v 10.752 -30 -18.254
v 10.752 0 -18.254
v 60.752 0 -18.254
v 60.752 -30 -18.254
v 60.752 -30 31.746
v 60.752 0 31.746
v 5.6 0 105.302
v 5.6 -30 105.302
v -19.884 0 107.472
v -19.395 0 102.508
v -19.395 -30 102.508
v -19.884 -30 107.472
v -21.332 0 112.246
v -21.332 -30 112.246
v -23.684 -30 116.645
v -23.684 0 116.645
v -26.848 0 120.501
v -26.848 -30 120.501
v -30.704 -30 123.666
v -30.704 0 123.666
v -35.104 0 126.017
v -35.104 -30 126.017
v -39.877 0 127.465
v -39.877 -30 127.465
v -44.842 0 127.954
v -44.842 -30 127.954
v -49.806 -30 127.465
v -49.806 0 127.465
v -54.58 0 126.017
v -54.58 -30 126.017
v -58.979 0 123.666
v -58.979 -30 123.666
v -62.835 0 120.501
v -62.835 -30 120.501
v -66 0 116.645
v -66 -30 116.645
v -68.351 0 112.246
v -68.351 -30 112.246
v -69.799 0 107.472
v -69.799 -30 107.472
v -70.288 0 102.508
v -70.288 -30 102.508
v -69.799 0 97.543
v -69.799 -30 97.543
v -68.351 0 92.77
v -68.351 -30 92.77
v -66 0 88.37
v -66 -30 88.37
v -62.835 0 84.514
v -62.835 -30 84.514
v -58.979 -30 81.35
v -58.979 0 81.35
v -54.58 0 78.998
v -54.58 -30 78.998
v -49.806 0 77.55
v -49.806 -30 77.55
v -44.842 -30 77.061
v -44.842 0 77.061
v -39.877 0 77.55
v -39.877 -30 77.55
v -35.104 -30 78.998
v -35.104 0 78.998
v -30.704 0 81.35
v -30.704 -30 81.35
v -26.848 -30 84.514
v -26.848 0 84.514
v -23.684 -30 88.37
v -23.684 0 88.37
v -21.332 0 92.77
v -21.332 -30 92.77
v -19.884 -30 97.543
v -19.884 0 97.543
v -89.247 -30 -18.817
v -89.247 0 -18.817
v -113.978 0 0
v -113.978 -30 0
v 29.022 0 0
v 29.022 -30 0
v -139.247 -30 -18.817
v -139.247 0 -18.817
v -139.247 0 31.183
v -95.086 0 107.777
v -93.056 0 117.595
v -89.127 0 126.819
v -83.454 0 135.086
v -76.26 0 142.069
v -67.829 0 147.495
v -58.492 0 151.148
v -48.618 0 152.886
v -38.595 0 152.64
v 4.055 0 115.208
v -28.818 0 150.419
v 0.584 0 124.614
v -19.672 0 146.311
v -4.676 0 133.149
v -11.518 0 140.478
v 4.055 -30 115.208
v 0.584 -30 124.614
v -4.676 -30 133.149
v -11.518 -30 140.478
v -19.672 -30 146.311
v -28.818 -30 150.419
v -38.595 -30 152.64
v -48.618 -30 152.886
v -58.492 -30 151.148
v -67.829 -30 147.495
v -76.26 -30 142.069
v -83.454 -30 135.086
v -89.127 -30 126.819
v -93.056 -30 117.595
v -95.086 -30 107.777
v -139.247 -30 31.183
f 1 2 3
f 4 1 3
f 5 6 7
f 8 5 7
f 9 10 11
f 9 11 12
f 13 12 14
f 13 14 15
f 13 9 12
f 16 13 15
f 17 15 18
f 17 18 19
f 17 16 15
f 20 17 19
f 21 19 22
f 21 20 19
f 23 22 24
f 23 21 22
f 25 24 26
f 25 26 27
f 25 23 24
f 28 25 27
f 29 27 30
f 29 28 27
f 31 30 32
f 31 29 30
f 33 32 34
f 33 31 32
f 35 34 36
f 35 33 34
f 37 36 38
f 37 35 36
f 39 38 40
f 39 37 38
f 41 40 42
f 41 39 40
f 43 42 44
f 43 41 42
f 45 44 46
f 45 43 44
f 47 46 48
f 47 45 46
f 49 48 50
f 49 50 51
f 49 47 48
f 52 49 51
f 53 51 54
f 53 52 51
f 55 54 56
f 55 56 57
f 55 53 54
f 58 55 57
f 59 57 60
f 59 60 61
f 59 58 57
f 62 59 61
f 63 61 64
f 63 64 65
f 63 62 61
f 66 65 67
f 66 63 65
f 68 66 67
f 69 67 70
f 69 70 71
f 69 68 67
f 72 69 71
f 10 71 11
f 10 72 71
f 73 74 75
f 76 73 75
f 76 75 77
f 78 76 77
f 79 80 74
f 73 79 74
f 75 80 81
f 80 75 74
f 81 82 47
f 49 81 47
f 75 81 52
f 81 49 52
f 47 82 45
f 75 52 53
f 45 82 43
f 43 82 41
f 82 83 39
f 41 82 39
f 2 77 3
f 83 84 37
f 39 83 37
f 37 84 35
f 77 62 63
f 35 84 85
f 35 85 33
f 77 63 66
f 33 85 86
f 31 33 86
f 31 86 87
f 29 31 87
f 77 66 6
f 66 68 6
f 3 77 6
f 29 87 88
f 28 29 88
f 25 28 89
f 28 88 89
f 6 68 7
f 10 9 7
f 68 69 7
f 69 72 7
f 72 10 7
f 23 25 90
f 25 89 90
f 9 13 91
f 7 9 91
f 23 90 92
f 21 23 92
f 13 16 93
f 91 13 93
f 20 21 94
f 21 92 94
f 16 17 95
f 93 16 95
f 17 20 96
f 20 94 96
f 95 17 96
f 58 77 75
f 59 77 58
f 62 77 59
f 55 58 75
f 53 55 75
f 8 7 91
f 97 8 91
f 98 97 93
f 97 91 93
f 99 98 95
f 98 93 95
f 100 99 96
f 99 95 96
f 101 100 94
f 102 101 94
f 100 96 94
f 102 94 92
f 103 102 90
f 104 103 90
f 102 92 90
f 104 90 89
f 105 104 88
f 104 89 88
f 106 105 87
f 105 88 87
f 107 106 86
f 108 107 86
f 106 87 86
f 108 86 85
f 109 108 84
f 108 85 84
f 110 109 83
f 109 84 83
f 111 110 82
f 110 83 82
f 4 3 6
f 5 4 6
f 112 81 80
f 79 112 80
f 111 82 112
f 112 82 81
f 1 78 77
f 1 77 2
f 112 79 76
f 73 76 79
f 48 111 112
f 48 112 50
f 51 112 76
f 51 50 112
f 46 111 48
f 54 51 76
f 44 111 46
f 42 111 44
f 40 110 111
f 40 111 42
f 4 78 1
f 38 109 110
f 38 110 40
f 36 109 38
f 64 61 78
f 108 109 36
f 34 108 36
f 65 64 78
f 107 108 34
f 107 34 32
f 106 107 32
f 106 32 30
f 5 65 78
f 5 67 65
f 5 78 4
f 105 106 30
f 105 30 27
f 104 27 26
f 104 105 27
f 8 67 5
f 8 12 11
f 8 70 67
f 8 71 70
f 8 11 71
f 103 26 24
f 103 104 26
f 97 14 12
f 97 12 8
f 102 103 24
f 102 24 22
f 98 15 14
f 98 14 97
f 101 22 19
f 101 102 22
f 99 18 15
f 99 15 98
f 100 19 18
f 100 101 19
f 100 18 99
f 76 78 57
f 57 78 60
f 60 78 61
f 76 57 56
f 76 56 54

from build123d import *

# Parameters (mm, degrees)
F0_R     = 25.446567
F1_DEPTH = 30


with BuildPart() as f1:
    # F0 (on Front) → F1 (new body)
    with BuildSketch(Plane.XZ):
        Polygon((60.751898, 31.746175), (-139.247308, 31.182794), (-139.247308, -18.817206), (-89.247308, -18.817206), (-113.978493, 0), (29.021507, 0), (10.751898, -18.253825), (60.751898, -18.253825), align=None)
        with BuildLine():
            Line((-95.085682, 107.776618), (-139.247308, 31.182794))
            Line((-139.247308, 31.182794), (60.751898, 31.746175))
            Line((60.751898, 31.746175), (5.600255, 105.301918))
            ThreePointArc((5.600255, 105.301918), (5.658245, 103.905416), (5.67758, 102.507845))
            ThreePointArc((5.67758, 102.507845), (-47.479786, 52.057386), (-95.085682, 107.776618))
        make_face()
        with BuildLine():
            ThreePointArc((5.600255, 105.301918), (-43.600489, 153.011972), (-95.085682, 107.776618))
            ThreePointArc((-95.085682, 107.776618), (-47.479786, 52.057386), (5.67758, 102.507845))
            ThreePointArc((5.67758, 102.507845), (5.658245, 103.905416), (5.600255, 105.301918))
        make_face()
        with Locations((-44.8418, 102.507845)):
            Circle(F0_R, mode=Mode.SUBTRACT)
    extrude(amount=F1_DEPTH)


solid = f1.part
